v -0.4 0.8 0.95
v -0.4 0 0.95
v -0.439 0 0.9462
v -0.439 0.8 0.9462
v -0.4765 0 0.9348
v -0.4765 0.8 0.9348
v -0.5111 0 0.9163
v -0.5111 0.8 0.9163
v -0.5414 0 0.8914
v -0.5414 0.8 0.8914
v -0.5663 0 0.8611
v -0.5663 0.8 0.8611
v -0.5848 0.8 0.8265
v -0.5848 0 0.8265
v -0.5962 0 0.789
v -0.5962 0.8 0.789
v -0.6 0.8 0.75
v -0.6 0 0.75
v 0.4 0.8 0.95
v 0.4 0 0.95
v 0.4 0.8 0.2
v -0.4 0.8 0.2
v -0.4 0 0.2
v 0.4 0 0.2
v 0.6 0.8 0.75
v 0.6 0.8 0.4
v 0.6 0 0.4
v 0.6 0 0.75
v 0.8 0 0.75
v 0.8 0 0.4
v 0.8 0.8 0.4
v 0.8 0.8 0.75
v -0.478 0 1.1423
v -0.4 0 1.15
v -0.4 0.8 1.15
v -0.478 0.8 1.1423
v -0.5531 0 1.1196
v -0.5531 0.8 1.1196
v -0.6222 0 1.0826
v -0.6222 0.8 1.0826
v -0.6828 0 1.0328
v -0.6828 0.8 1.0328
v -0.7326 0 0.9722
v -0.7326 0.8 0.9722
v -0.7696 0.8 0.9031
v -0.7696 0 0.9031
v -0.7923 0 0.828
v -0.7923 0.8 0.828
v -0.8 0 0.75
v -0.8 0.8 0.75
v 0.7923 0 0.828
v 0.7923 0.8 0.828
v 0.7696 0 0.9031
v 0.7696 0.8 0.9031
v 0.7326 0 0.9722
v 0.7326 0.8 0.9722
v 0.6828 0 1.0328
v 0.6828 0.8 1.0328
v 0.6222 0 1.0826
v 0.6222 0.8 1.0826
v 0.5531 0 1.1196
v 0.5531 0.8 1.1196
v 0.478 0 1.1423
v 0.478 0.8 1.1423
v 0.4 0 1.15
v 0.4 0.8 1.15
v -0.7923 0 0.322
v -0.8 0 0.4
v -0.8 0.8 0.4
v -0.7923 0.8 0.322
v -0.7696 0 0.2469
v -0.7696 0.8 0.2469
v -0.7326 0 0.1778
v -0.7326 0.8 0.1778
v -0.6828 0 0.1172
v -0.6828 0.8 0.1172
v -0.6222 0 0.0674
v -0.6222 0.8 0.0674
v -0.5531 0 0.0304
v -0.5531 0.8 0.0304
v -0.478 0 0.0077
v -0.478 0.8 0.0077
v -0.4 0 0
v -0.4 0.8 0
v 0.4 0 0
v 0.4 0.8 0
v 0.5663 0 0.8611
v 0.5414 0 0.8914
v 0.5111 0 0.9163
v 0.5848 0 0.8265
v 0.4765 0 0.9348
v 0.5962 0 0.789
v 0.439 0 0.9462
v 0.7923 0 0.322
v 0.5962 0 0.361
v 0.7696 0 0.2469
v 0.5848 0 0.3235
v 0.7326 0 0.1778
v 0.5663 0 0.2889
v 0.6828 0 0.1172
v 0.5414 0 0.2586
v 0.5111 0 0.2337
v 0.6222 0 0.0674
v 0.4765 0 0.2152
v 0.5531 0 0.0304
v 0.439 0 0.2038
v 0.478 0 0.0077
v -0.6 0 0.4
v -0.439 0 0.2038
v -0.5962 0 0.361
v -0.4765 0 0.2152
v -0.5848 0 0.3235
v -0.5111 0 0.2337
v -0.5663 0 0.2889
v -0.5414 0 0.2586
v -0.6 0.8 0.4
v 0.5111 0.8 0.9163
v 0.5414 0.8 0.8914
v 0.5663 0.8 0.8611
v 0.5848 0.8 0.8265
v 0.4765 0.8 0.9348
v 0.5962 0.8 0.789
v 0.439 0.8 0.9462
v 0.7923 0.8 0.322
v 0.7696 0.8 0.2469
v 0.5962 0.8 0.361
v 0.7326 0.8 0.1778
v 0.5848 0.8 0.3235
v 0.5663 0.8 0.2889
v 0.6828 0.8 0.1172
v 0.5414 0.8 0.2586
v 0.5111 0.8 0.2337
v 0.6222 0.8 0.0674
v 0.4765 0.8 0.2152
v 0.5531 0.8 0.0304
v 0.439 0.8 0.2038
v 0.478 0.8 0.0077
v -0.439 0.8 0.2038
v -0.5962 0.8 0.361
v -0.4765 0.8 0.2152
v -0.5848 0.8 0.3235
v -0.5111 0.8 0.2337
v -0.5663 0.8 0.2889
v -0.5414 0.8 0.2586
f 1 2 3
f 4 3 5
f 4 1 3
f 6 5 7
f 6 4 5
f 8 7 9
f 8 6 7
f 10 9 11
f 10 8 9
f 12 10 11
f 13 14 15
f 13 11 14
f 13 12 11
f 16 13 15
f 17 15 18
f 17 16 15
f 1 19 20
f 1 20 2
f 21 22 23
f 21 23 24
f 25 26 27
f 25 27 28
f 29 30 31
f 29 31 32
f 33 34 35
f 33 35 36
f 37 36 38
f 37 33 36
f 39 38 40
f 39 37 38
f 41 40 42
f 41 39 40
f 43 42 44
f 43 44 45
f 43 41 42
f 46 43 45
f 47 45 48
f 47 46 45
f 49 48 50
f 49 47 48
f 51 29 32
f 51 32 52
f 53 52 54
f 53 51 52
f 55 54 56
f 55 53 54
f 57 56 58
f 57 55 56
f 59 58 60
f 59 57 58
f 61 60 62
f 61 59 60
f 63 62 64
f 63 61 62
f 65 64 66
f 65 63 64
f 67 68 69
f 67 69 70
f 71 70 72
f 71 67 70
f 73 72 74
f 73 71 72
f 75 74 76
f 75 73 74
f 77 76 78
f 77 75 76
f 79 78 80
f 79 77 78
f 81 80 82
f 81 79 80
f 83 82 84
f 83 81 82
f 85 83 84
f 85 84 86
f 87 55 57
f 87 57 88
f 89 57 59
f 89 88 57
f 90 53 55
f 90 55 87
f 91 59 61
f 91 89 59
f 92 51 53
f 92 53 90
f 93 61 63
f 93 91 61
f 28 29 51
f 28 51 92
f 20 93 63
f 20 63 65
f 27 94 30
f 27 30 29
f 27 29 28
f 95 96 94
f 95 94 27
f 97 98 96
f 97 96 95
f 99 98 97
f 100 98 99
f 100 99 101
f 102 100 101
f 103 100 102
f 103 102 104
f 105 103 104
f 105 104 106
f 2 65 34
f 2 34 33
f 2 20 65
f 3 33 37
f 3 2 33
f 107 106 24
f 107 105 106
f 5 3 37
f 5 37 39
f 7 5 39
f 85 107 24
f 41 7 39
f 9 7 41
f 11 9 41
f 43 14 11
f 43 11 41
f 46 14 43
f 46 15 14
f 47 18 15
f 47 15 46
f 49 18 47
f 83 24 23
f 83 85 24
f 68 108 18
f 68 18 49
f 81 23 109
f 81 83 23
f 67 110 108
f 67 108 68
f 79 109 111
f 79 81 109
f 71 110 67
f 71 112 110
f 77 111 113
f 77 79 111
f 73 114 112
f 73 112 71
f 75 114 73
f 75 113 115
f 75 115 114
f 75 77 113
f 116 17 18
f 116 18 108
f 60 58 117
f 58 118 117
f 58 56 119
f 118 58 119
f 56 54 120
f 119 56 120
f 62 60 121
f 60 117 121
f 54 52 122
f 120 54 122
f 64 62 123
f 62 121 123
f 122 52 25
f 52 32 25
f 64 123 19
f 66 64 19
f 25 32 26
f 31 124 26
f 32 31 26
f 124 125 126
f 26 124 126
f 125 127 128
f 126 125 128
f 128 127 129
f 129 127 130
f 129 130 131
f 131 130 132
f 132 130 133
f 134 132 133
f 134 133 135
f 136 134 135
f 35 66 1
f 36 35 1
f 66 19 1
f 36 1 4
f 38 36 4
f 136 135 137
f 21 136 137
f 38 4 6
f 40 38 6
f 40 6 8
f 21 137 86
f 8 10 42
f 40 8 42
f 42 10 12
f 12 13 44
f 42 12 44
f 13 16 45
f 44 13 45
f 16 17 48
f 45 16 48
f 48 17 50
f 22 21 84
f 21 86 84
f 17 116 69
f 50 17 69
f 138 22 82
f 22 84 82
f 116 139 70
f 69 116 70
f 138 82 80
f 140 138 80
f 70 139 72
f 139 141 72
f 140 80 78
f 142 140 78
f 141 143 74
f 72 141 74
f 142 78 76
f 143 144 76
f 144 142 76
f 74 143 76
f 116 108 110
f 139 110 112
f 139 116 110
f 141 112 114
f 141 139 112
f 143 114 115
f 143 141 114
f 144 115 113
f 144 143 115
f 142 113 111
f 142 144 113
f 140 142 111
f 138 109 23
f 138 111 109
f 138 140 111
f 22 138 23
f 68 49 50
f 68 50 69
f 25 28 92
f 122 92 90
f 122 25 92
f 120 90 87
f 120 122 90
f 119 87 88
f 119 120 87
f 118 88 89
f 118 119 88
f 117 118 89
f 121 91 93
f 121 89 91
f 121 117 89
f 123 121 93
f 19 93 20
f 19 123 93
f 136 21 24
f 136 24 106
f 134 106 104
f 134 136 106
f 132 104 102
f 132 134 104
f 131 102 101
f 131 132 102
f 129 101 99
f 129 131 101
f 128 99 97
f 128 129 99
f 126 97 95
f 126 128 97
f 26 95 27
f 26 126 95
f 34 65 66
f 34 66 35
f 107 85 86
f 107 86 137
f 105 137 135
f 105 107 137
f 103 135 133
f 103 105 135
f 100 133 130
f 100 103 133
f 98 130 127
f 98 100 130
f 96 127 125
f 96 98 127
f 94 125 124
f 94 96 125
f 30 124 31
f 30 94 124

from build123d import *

# Parameters (mm, degrees)
BOSS_EXTRUDE1_DEPTH = 0.8
CUT_EXTRUDE1_DEPTH  = 2.61322658


with BuildPart() as part:
    # Sketch1 → Boss-Extrude1 (new body)
    with BuildSketch(Plane(origin=(0, 0, 0), x_dir=(1, 0, 0), z_dir=(0, 1, 0))):
        with BuildLine():
            Line((0, 0), (0.4, 0))
            ThreePointArc((0.4, 0), (0.682842712, -0.117157288), (0.8, -0.4))
            Line((0.8, -0.4), (0.8, -0.75))
            ThreePointArc((0.8, -0.75), (0.682842712, -1.032842712), (0.4, -1.15))
            Line((0.4, -1.15), (-0.4, -1.15))
            ThreePointArc((-0.4, -1.15), (-0.682842712, -1.032842712), (-0.8, -0.75))
            Line((-0.8, -0.75), (-0.8, -0.4))
            ThreePointArc((-0.8, -0.4), (-0.682842712, -0.117157288), (-0.4, 0))
            Line((-0.4, 0), (0, 0))
        make_face()
    extrude(amount=BOSS_EXTRUDE1_DEPTH)

    # Sketch2 → Cut-Extrude1 (cut, through all)
    with BuildSketch(Plane(origin=(0, 0.8, 0), x_dir=(1, 0, 0), z_dir=(0, 1, 0))):
        with BuildLine():
            Line((-0.4, -0.2), (0.4, -0.2))
            ThreePointArc((0.4, -0.2), (0.541421356, -0.258578644), (0.6, -0.4))
            Line((0.6, -0.4), (0.6, -0.75))
            ThreePointArc((0.6, -0.75), (0.541421356, -0.891421356), (0.4, -0.95))
            Line((0.4, -0.95), (-0.4, -0.95))
            ThreePointArc((-0.4, -0.95), (-0.541421356, -0.891421356), (-0.6, -0.75))
            Line((-0.6, -0.75), (-0.6, -0.4))
            ThreePointArc((-0.6, -0.4), (-0.541421356, -0.258578644), (-0.4, -0.2))
        make_face()
    extrude(amount=-CUT_EXTRUDE1_DEPTH, mode=Mode.SUBTRACT)


solid = part.part
